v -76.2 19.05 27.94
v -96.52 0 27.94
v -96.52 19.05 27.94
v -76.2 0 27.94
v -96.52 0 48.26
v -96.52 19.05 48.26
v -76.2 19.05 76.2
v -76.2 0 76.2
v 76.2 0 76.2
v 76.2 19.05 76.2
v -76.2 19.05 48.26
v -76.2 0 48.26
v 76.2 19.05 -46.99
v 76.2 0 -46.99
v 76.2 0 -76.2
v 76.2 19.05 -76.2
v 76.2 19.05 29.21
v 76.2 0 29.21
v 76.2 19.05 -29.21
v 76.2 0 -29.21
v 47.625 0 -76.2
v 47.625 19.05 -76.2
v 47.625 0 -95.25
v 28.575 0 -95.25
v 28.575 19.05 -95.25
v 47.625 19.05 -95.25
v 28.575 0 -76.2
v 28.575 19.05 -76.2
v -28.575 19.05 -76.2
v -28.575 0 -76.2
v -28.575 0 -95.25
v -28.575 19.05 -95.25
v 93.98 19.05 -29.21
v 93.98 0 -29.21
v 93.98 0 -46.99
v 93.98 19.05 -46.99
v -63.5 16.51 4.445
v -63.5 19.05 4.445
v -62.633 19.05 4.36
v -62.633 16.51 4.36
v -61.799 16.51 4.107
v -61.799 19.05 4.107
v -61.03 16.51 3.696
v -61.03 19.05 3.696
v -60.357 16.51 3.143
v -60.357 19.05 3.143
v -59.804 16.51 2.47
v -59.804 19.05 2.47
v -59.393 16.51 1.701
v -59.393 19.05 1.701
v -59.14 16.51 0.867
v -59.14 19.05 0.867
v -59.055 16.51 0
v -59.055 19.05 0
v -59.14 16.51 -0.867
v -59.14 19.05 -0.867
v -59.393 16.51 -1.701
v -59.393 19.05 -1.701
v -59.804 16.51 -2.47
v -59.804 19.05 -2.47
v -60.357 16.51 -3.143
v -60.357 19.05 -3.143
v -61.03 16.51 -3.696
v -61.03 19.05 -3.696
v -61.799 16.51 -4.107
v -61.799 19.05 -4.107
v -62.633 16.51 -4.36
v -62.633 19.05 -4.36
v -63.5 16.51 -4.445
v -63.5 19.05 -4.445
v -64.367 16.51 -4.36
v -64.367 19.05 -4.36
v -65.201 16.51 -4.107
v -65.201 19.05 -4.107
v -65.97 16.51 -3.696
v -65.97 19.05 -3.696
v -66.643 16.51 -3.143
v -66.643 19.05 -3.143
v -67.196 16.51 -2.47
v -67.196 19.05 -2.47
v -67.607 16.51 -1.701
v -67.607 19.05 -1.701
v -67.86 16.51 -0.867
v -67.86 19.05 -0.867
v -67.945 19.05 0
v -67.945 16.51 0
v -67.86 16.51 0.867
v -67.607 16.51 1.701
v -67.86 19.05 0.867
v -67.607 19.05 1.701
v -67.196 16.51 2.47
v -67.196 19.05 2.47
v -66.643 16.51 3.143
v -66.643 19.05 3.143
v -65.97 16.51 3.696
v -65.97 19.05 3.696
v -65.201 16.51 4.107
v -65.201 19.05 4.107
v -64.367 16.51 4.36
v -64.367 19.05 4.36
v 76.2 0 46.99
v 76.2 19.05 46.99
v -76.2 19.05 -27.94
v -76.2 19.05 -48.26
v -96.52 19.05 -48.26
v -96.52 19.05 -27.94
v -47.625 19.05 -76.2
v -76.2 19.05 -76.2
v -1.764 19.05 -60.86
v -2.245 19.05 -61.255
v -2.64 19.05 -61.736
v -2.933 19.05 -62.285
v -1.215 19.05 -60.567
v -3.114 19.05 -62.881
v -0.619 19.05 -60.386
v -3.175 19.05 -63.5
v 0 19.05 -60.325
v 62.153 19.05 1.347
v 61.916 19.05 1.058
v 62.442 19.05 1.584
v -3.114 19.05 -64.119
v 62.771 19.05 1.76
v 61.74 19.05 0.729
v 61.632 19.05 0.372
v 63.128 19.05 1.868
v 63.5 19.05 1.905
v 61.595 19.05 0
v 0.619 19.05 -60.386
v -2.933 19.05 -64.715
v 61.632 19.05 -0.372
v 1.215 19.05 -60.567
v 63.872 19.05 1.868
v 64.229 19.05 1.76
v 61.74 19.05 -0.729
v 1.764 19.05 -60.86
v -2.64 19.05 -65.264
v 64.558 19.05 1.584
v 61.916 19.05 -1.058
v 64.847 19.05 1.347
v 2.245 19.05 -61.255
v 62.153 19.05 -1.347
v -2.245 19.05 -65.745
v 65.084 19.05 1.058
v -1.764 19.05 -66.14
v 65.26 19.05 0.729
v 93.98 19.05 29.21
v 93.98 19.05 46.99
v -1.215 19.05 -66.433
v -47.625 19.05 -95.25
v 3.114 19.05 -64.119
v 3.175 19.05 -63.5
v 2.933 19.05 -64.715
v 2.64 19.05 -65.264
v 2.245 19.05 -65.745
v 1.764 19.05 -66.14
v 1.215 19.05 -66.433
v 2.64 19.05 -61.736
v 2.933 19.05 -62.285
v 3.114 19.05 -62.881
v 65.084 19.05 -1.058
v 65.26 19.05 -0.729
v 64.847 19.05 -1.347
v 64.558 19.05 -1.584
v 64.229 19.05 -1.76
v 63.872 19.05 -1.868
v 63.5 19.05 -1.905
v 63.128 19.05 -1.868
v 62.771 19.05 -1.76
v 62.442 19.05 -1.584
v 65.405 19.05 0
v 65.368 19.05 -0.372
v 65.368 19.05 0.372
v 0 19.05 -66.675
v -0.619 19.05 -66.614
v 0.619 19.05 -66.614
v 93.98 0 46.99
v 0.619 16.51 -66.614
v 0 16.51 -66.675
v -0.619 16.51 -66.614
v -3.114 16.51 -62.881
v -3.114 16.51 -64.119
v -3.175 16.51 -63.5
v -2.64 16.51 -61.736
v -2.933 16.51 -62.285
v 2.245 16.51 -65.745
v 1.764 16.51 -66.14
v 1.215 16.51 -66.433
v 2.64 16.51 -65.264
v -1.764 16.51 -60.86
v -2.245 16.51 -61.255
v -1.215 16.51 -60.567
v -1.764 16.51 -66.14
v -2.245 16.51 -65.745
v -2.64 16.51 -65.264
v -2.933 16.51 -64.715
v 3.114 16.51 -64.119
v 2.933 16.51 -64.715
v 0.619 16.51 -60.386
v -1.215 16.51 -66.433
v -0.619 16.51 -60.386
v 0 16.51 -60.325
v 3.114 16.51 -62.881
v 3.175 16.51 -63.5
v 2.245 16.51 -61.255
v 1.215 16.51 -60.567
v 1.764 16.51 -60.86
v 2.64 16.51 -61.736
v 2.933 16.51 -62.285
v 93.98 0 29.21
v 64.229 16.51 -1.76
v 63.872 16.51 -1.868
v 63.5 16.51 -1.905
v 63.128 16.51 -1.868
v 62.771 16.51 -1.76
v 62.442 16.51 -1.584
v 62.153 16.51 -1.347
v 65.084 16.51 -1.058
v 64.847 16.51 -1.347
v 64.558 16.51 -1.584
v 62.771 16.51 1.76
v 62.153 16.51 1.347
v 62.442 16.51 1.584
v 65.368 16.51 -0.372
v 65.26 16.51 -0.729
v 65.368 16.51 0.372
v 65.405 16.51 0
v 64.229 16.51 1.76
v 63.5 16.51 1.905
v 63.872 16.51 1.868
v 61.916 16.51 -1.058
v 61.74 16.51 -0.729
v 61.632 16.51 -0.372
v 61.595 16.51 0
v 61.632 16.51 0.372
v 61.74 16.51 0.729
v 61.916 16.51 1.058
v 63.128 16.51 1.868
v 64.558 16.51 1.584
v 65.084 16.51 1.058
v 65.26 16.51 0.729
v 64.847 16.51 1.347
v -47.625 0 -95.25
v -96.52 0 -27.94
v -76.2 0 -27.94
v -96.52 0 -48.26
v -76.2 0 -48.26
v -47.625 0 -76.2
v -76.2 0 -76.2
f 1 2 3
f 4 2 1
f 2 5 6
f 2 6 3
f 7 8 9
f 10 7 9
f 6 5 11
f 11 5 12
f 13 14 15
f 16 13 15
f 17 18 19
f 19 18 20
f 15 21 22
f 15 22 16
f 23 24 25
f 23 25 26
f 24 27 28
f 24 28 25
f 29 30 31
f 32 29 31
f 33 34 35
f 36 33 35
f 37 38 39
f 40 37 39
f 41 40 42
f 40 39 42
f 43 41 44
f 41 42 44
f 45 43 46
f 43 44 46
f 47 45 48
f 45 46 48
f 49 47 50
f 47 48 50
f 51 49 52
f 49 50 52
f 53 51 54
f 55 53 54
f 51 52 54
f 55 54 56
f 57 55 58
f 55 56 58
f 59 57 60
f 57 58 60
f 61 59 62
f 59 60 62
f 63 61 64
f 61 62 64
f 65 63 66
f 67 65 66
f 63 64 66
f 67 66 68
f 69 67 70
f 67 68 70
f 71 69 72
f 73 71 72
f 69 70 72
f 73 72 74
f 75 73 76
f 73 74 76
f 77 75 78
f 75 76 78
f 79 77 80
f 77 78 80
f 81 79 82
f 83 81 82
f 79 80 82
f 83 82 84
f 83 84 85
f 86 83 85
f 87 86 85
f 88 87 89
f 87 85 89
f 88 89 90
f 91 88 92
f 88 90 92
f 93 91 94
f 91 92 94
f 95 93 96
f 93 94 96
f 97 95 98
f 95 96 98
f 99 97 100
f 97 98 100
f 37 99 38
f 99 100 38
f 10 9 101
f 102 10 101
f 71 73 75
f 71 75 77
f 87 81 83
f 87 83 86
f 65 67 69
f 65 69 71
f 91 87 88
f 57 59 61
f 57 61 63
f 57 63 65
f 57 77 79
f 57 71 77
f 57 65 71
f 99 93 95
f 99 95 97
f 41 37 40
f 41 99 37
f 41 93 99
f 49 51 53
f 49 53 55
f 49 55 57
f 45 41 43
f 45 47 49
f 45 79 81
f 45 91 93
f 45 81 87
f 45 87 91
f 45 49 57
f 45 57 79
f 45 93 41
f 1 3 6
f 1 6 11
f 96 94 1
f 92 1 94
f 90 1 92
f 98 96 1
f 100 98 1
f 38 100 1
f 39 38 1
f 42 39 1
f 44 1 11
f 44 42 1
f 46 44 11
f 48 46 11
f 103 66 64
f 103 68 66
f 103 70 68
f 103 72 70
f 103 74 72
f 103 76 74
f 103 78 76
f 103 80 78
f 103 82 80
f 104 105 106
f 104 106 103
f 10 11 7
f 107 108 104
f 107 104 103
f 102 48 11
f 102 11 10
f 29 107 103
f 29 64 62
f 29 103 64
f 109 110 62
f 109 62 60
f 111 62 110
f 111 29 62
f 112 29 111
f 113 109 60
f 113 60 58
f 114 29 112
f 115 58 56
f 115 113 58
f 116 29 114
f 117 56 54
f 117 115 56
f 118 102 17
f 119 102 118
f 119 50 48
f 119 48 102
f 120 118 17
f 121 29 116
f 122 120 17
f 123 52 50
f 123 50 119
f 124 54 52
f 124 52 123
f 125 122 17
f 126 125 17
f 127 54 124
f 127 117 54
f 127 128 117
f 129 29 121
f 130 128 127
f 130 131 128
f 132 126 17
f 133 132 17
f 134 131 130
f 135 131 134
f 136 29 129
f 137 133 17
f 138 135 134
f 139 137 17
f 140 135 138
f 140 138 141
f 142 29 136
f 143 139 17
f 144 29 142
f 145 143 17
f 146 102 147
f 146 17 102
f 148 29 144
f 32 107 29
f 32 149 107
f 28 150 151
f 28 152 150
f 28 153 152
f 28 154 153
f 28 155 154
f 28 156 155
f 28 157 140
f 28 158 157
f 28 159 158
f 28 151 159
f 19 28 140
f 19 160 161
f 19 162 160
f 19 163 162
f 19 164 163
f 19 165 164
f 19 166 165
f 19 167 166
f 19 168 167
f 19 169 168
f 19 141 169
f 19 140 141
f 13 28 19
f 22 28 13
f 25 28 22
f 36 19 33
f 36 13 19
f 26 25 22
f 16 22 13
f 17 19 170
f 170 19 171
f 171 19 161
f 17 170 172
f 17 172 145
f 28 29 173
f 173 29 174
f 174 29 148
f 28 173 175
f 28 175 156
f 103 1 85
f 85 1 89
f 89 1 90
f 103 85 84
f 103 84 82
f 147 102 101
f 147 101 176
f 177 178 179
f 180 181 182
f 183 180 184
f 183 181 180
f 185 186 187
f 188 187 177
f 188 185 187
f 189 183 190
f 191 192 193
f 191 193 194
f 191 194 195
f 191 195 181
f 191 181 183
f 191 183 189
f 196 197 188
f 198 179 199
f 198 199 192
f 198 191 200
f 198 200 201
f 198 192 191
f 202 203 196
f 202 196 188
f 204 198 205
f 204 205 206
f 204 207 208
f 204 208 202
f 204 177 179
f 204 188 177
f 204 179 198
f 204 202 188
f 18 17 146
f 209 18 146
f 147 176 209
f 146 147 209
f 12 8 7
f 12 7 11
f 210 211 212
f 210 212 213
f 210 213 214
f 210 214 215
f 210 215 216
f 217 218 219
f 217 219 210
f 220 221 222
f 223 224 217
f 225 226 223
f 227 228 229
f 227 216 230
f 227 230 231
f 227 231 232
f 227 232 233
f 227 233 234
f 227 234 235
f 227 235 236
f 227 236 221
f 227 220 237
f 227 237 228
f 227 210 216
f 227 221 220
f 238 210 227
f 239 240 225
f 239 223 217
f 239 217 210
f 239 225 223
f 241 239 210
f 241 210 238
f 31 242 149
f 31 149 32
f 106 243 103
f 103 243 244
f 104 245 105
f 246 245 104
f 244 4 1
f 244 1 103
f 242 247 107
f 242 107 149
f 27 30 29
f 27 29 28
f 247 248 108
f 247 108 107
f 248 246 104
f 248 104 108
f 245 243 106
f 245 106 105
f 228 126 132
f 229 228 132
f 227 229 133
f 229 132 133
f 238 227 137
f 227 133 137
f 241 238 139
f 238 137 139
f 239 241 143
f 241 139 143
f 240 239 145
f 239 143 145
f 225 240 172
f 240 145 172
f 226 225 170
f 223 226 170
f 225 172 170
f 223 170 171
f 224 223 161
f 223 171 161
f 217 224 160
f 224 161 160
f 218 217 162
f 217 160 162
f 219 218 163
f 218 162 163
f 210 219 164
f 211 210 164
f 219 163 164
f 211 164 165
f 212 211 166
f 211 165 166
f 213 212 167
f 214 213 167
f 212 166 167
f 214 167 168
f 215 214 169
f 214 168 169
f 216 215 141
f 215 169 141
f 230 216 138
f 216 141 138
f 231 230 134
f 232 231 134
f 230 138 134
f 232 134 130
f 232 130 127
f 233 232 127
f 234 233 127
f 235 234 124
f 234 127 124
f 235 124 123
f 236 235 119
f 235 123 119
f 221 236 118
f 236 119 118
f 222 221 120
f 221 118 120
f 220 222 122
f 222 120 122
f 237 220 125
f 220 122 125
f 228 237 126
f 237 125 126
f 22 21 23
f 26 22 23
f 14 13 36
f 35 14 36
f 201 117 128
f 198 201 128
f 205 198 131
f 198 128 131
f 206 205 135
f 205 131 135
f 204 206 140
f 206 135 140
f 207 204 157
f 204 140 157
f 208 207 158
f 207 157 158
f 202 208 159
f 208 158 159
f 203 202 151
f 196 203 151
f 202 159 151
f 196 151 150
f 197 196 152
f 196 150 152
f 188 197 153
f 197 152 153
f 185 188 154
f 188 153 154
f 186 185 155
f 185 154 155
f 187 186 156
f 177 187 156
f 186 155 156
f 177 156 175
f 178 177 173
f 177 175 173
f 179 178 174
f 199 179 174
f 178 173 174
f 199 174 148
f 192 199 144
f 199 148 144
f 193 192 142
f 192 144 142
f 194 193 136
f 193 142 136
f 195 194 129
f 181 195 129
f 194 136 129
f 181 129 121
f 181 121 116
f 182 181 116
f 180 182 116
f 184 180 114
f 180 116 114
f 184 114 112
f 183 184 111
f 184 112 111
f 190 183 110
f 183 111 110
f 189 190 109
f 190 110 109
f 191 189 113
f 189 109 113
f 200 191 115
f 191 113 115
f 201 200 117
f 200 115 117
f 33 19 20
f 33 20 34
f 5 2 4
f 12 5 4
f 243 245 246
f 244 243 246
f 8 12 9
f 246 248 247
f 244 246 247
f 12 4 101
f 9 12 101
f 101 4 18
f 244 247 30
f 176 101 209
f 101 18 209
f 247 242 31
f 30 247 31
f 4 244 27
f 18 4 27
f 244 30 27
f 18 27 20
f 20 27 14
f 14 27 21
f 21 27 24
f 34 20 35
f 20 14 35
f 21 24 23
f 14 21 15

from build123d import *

# Parameters (mm, degrees)
SKETCH1_W           = 152.4
SKETCH1_H           = 152.4
SKETCH1_W_2         = 20.32
SKETCH1_H_2         = 20.32
SKETCH1_W_3         = 19.05
SKETCH1_H_3         = 19.05
SKETCH1_W_4         = 17.78
SKETCH1_H_4         = 17.78
BOSS_EXTRUDE1_DEPTH = 19.05
SKETCH2_R           = 1.905
SKETCH2_R_2         = 3.175
SKETCH2_R_3         = 4.445
CUT_EXTRUDE1_DEPTH  = 2.54


with BuildPart() as part:
    # Sketch1 → Boss-Extrude1 (new body)
    with BuildSketch(Plane(origin=(0, 0, 0), x_dir=(1, 0, 0), z_dir=(0, 1, 0))):
        Rectangle(SKETCH1_W, SKETCH1_H)
        with Locations((-86.36, -38.1)):
            Rectangle(SKETCH1_W_2, SKETCH1_H_2)
        with Locations((-86.36, 38.1)):
            Rectangle(SKETCH1_W_2, SKETCH1_H_2)
        with Locations((-38.1, 85.725)):
            Rectangle(SKETCH1_W_3, SKETCH1_H_3)
        with Locations((38.1, 85.725)):
            Rectangle(SKETCH1_W_3, SKETCH1_H_3)
        with Locations((85.09, 38.1)):
            Rectangle(SKETCH1_W_4, SKETCH1_H_4)
        with Locations((85.09, -38.1)):
            Rectangle(SKETCH1_W_4, SKETCH1_H_4)
    extrude(amount=BOSS_EXTRUDE1_DEPTH)

    # Sketch2 → Cut-Extrude1 (cut)
    with BuildSketch(Plane(origin=(0, 19.05, 0), x_dir=(1, 0, 0), z_dir=(0, 1, 0))):
        with Locations(Location((63.5, 0, 0), (0, 0, 270))):
            Circle(SKETCH2_R)
        with Locations(Location((0, 63.5, 0), (0, 0, 270))):
            Circle(SKETCH2_R_2)
        with Locations(Location((-63.5, 0, 0), (0, 0, 270))):
            Circle(SKETCH2_R_3)
    extrude(amount=-CUT_EXTRUDE1_DEPTH, mode=Mode.SUBTRACT)


solid = part.part
